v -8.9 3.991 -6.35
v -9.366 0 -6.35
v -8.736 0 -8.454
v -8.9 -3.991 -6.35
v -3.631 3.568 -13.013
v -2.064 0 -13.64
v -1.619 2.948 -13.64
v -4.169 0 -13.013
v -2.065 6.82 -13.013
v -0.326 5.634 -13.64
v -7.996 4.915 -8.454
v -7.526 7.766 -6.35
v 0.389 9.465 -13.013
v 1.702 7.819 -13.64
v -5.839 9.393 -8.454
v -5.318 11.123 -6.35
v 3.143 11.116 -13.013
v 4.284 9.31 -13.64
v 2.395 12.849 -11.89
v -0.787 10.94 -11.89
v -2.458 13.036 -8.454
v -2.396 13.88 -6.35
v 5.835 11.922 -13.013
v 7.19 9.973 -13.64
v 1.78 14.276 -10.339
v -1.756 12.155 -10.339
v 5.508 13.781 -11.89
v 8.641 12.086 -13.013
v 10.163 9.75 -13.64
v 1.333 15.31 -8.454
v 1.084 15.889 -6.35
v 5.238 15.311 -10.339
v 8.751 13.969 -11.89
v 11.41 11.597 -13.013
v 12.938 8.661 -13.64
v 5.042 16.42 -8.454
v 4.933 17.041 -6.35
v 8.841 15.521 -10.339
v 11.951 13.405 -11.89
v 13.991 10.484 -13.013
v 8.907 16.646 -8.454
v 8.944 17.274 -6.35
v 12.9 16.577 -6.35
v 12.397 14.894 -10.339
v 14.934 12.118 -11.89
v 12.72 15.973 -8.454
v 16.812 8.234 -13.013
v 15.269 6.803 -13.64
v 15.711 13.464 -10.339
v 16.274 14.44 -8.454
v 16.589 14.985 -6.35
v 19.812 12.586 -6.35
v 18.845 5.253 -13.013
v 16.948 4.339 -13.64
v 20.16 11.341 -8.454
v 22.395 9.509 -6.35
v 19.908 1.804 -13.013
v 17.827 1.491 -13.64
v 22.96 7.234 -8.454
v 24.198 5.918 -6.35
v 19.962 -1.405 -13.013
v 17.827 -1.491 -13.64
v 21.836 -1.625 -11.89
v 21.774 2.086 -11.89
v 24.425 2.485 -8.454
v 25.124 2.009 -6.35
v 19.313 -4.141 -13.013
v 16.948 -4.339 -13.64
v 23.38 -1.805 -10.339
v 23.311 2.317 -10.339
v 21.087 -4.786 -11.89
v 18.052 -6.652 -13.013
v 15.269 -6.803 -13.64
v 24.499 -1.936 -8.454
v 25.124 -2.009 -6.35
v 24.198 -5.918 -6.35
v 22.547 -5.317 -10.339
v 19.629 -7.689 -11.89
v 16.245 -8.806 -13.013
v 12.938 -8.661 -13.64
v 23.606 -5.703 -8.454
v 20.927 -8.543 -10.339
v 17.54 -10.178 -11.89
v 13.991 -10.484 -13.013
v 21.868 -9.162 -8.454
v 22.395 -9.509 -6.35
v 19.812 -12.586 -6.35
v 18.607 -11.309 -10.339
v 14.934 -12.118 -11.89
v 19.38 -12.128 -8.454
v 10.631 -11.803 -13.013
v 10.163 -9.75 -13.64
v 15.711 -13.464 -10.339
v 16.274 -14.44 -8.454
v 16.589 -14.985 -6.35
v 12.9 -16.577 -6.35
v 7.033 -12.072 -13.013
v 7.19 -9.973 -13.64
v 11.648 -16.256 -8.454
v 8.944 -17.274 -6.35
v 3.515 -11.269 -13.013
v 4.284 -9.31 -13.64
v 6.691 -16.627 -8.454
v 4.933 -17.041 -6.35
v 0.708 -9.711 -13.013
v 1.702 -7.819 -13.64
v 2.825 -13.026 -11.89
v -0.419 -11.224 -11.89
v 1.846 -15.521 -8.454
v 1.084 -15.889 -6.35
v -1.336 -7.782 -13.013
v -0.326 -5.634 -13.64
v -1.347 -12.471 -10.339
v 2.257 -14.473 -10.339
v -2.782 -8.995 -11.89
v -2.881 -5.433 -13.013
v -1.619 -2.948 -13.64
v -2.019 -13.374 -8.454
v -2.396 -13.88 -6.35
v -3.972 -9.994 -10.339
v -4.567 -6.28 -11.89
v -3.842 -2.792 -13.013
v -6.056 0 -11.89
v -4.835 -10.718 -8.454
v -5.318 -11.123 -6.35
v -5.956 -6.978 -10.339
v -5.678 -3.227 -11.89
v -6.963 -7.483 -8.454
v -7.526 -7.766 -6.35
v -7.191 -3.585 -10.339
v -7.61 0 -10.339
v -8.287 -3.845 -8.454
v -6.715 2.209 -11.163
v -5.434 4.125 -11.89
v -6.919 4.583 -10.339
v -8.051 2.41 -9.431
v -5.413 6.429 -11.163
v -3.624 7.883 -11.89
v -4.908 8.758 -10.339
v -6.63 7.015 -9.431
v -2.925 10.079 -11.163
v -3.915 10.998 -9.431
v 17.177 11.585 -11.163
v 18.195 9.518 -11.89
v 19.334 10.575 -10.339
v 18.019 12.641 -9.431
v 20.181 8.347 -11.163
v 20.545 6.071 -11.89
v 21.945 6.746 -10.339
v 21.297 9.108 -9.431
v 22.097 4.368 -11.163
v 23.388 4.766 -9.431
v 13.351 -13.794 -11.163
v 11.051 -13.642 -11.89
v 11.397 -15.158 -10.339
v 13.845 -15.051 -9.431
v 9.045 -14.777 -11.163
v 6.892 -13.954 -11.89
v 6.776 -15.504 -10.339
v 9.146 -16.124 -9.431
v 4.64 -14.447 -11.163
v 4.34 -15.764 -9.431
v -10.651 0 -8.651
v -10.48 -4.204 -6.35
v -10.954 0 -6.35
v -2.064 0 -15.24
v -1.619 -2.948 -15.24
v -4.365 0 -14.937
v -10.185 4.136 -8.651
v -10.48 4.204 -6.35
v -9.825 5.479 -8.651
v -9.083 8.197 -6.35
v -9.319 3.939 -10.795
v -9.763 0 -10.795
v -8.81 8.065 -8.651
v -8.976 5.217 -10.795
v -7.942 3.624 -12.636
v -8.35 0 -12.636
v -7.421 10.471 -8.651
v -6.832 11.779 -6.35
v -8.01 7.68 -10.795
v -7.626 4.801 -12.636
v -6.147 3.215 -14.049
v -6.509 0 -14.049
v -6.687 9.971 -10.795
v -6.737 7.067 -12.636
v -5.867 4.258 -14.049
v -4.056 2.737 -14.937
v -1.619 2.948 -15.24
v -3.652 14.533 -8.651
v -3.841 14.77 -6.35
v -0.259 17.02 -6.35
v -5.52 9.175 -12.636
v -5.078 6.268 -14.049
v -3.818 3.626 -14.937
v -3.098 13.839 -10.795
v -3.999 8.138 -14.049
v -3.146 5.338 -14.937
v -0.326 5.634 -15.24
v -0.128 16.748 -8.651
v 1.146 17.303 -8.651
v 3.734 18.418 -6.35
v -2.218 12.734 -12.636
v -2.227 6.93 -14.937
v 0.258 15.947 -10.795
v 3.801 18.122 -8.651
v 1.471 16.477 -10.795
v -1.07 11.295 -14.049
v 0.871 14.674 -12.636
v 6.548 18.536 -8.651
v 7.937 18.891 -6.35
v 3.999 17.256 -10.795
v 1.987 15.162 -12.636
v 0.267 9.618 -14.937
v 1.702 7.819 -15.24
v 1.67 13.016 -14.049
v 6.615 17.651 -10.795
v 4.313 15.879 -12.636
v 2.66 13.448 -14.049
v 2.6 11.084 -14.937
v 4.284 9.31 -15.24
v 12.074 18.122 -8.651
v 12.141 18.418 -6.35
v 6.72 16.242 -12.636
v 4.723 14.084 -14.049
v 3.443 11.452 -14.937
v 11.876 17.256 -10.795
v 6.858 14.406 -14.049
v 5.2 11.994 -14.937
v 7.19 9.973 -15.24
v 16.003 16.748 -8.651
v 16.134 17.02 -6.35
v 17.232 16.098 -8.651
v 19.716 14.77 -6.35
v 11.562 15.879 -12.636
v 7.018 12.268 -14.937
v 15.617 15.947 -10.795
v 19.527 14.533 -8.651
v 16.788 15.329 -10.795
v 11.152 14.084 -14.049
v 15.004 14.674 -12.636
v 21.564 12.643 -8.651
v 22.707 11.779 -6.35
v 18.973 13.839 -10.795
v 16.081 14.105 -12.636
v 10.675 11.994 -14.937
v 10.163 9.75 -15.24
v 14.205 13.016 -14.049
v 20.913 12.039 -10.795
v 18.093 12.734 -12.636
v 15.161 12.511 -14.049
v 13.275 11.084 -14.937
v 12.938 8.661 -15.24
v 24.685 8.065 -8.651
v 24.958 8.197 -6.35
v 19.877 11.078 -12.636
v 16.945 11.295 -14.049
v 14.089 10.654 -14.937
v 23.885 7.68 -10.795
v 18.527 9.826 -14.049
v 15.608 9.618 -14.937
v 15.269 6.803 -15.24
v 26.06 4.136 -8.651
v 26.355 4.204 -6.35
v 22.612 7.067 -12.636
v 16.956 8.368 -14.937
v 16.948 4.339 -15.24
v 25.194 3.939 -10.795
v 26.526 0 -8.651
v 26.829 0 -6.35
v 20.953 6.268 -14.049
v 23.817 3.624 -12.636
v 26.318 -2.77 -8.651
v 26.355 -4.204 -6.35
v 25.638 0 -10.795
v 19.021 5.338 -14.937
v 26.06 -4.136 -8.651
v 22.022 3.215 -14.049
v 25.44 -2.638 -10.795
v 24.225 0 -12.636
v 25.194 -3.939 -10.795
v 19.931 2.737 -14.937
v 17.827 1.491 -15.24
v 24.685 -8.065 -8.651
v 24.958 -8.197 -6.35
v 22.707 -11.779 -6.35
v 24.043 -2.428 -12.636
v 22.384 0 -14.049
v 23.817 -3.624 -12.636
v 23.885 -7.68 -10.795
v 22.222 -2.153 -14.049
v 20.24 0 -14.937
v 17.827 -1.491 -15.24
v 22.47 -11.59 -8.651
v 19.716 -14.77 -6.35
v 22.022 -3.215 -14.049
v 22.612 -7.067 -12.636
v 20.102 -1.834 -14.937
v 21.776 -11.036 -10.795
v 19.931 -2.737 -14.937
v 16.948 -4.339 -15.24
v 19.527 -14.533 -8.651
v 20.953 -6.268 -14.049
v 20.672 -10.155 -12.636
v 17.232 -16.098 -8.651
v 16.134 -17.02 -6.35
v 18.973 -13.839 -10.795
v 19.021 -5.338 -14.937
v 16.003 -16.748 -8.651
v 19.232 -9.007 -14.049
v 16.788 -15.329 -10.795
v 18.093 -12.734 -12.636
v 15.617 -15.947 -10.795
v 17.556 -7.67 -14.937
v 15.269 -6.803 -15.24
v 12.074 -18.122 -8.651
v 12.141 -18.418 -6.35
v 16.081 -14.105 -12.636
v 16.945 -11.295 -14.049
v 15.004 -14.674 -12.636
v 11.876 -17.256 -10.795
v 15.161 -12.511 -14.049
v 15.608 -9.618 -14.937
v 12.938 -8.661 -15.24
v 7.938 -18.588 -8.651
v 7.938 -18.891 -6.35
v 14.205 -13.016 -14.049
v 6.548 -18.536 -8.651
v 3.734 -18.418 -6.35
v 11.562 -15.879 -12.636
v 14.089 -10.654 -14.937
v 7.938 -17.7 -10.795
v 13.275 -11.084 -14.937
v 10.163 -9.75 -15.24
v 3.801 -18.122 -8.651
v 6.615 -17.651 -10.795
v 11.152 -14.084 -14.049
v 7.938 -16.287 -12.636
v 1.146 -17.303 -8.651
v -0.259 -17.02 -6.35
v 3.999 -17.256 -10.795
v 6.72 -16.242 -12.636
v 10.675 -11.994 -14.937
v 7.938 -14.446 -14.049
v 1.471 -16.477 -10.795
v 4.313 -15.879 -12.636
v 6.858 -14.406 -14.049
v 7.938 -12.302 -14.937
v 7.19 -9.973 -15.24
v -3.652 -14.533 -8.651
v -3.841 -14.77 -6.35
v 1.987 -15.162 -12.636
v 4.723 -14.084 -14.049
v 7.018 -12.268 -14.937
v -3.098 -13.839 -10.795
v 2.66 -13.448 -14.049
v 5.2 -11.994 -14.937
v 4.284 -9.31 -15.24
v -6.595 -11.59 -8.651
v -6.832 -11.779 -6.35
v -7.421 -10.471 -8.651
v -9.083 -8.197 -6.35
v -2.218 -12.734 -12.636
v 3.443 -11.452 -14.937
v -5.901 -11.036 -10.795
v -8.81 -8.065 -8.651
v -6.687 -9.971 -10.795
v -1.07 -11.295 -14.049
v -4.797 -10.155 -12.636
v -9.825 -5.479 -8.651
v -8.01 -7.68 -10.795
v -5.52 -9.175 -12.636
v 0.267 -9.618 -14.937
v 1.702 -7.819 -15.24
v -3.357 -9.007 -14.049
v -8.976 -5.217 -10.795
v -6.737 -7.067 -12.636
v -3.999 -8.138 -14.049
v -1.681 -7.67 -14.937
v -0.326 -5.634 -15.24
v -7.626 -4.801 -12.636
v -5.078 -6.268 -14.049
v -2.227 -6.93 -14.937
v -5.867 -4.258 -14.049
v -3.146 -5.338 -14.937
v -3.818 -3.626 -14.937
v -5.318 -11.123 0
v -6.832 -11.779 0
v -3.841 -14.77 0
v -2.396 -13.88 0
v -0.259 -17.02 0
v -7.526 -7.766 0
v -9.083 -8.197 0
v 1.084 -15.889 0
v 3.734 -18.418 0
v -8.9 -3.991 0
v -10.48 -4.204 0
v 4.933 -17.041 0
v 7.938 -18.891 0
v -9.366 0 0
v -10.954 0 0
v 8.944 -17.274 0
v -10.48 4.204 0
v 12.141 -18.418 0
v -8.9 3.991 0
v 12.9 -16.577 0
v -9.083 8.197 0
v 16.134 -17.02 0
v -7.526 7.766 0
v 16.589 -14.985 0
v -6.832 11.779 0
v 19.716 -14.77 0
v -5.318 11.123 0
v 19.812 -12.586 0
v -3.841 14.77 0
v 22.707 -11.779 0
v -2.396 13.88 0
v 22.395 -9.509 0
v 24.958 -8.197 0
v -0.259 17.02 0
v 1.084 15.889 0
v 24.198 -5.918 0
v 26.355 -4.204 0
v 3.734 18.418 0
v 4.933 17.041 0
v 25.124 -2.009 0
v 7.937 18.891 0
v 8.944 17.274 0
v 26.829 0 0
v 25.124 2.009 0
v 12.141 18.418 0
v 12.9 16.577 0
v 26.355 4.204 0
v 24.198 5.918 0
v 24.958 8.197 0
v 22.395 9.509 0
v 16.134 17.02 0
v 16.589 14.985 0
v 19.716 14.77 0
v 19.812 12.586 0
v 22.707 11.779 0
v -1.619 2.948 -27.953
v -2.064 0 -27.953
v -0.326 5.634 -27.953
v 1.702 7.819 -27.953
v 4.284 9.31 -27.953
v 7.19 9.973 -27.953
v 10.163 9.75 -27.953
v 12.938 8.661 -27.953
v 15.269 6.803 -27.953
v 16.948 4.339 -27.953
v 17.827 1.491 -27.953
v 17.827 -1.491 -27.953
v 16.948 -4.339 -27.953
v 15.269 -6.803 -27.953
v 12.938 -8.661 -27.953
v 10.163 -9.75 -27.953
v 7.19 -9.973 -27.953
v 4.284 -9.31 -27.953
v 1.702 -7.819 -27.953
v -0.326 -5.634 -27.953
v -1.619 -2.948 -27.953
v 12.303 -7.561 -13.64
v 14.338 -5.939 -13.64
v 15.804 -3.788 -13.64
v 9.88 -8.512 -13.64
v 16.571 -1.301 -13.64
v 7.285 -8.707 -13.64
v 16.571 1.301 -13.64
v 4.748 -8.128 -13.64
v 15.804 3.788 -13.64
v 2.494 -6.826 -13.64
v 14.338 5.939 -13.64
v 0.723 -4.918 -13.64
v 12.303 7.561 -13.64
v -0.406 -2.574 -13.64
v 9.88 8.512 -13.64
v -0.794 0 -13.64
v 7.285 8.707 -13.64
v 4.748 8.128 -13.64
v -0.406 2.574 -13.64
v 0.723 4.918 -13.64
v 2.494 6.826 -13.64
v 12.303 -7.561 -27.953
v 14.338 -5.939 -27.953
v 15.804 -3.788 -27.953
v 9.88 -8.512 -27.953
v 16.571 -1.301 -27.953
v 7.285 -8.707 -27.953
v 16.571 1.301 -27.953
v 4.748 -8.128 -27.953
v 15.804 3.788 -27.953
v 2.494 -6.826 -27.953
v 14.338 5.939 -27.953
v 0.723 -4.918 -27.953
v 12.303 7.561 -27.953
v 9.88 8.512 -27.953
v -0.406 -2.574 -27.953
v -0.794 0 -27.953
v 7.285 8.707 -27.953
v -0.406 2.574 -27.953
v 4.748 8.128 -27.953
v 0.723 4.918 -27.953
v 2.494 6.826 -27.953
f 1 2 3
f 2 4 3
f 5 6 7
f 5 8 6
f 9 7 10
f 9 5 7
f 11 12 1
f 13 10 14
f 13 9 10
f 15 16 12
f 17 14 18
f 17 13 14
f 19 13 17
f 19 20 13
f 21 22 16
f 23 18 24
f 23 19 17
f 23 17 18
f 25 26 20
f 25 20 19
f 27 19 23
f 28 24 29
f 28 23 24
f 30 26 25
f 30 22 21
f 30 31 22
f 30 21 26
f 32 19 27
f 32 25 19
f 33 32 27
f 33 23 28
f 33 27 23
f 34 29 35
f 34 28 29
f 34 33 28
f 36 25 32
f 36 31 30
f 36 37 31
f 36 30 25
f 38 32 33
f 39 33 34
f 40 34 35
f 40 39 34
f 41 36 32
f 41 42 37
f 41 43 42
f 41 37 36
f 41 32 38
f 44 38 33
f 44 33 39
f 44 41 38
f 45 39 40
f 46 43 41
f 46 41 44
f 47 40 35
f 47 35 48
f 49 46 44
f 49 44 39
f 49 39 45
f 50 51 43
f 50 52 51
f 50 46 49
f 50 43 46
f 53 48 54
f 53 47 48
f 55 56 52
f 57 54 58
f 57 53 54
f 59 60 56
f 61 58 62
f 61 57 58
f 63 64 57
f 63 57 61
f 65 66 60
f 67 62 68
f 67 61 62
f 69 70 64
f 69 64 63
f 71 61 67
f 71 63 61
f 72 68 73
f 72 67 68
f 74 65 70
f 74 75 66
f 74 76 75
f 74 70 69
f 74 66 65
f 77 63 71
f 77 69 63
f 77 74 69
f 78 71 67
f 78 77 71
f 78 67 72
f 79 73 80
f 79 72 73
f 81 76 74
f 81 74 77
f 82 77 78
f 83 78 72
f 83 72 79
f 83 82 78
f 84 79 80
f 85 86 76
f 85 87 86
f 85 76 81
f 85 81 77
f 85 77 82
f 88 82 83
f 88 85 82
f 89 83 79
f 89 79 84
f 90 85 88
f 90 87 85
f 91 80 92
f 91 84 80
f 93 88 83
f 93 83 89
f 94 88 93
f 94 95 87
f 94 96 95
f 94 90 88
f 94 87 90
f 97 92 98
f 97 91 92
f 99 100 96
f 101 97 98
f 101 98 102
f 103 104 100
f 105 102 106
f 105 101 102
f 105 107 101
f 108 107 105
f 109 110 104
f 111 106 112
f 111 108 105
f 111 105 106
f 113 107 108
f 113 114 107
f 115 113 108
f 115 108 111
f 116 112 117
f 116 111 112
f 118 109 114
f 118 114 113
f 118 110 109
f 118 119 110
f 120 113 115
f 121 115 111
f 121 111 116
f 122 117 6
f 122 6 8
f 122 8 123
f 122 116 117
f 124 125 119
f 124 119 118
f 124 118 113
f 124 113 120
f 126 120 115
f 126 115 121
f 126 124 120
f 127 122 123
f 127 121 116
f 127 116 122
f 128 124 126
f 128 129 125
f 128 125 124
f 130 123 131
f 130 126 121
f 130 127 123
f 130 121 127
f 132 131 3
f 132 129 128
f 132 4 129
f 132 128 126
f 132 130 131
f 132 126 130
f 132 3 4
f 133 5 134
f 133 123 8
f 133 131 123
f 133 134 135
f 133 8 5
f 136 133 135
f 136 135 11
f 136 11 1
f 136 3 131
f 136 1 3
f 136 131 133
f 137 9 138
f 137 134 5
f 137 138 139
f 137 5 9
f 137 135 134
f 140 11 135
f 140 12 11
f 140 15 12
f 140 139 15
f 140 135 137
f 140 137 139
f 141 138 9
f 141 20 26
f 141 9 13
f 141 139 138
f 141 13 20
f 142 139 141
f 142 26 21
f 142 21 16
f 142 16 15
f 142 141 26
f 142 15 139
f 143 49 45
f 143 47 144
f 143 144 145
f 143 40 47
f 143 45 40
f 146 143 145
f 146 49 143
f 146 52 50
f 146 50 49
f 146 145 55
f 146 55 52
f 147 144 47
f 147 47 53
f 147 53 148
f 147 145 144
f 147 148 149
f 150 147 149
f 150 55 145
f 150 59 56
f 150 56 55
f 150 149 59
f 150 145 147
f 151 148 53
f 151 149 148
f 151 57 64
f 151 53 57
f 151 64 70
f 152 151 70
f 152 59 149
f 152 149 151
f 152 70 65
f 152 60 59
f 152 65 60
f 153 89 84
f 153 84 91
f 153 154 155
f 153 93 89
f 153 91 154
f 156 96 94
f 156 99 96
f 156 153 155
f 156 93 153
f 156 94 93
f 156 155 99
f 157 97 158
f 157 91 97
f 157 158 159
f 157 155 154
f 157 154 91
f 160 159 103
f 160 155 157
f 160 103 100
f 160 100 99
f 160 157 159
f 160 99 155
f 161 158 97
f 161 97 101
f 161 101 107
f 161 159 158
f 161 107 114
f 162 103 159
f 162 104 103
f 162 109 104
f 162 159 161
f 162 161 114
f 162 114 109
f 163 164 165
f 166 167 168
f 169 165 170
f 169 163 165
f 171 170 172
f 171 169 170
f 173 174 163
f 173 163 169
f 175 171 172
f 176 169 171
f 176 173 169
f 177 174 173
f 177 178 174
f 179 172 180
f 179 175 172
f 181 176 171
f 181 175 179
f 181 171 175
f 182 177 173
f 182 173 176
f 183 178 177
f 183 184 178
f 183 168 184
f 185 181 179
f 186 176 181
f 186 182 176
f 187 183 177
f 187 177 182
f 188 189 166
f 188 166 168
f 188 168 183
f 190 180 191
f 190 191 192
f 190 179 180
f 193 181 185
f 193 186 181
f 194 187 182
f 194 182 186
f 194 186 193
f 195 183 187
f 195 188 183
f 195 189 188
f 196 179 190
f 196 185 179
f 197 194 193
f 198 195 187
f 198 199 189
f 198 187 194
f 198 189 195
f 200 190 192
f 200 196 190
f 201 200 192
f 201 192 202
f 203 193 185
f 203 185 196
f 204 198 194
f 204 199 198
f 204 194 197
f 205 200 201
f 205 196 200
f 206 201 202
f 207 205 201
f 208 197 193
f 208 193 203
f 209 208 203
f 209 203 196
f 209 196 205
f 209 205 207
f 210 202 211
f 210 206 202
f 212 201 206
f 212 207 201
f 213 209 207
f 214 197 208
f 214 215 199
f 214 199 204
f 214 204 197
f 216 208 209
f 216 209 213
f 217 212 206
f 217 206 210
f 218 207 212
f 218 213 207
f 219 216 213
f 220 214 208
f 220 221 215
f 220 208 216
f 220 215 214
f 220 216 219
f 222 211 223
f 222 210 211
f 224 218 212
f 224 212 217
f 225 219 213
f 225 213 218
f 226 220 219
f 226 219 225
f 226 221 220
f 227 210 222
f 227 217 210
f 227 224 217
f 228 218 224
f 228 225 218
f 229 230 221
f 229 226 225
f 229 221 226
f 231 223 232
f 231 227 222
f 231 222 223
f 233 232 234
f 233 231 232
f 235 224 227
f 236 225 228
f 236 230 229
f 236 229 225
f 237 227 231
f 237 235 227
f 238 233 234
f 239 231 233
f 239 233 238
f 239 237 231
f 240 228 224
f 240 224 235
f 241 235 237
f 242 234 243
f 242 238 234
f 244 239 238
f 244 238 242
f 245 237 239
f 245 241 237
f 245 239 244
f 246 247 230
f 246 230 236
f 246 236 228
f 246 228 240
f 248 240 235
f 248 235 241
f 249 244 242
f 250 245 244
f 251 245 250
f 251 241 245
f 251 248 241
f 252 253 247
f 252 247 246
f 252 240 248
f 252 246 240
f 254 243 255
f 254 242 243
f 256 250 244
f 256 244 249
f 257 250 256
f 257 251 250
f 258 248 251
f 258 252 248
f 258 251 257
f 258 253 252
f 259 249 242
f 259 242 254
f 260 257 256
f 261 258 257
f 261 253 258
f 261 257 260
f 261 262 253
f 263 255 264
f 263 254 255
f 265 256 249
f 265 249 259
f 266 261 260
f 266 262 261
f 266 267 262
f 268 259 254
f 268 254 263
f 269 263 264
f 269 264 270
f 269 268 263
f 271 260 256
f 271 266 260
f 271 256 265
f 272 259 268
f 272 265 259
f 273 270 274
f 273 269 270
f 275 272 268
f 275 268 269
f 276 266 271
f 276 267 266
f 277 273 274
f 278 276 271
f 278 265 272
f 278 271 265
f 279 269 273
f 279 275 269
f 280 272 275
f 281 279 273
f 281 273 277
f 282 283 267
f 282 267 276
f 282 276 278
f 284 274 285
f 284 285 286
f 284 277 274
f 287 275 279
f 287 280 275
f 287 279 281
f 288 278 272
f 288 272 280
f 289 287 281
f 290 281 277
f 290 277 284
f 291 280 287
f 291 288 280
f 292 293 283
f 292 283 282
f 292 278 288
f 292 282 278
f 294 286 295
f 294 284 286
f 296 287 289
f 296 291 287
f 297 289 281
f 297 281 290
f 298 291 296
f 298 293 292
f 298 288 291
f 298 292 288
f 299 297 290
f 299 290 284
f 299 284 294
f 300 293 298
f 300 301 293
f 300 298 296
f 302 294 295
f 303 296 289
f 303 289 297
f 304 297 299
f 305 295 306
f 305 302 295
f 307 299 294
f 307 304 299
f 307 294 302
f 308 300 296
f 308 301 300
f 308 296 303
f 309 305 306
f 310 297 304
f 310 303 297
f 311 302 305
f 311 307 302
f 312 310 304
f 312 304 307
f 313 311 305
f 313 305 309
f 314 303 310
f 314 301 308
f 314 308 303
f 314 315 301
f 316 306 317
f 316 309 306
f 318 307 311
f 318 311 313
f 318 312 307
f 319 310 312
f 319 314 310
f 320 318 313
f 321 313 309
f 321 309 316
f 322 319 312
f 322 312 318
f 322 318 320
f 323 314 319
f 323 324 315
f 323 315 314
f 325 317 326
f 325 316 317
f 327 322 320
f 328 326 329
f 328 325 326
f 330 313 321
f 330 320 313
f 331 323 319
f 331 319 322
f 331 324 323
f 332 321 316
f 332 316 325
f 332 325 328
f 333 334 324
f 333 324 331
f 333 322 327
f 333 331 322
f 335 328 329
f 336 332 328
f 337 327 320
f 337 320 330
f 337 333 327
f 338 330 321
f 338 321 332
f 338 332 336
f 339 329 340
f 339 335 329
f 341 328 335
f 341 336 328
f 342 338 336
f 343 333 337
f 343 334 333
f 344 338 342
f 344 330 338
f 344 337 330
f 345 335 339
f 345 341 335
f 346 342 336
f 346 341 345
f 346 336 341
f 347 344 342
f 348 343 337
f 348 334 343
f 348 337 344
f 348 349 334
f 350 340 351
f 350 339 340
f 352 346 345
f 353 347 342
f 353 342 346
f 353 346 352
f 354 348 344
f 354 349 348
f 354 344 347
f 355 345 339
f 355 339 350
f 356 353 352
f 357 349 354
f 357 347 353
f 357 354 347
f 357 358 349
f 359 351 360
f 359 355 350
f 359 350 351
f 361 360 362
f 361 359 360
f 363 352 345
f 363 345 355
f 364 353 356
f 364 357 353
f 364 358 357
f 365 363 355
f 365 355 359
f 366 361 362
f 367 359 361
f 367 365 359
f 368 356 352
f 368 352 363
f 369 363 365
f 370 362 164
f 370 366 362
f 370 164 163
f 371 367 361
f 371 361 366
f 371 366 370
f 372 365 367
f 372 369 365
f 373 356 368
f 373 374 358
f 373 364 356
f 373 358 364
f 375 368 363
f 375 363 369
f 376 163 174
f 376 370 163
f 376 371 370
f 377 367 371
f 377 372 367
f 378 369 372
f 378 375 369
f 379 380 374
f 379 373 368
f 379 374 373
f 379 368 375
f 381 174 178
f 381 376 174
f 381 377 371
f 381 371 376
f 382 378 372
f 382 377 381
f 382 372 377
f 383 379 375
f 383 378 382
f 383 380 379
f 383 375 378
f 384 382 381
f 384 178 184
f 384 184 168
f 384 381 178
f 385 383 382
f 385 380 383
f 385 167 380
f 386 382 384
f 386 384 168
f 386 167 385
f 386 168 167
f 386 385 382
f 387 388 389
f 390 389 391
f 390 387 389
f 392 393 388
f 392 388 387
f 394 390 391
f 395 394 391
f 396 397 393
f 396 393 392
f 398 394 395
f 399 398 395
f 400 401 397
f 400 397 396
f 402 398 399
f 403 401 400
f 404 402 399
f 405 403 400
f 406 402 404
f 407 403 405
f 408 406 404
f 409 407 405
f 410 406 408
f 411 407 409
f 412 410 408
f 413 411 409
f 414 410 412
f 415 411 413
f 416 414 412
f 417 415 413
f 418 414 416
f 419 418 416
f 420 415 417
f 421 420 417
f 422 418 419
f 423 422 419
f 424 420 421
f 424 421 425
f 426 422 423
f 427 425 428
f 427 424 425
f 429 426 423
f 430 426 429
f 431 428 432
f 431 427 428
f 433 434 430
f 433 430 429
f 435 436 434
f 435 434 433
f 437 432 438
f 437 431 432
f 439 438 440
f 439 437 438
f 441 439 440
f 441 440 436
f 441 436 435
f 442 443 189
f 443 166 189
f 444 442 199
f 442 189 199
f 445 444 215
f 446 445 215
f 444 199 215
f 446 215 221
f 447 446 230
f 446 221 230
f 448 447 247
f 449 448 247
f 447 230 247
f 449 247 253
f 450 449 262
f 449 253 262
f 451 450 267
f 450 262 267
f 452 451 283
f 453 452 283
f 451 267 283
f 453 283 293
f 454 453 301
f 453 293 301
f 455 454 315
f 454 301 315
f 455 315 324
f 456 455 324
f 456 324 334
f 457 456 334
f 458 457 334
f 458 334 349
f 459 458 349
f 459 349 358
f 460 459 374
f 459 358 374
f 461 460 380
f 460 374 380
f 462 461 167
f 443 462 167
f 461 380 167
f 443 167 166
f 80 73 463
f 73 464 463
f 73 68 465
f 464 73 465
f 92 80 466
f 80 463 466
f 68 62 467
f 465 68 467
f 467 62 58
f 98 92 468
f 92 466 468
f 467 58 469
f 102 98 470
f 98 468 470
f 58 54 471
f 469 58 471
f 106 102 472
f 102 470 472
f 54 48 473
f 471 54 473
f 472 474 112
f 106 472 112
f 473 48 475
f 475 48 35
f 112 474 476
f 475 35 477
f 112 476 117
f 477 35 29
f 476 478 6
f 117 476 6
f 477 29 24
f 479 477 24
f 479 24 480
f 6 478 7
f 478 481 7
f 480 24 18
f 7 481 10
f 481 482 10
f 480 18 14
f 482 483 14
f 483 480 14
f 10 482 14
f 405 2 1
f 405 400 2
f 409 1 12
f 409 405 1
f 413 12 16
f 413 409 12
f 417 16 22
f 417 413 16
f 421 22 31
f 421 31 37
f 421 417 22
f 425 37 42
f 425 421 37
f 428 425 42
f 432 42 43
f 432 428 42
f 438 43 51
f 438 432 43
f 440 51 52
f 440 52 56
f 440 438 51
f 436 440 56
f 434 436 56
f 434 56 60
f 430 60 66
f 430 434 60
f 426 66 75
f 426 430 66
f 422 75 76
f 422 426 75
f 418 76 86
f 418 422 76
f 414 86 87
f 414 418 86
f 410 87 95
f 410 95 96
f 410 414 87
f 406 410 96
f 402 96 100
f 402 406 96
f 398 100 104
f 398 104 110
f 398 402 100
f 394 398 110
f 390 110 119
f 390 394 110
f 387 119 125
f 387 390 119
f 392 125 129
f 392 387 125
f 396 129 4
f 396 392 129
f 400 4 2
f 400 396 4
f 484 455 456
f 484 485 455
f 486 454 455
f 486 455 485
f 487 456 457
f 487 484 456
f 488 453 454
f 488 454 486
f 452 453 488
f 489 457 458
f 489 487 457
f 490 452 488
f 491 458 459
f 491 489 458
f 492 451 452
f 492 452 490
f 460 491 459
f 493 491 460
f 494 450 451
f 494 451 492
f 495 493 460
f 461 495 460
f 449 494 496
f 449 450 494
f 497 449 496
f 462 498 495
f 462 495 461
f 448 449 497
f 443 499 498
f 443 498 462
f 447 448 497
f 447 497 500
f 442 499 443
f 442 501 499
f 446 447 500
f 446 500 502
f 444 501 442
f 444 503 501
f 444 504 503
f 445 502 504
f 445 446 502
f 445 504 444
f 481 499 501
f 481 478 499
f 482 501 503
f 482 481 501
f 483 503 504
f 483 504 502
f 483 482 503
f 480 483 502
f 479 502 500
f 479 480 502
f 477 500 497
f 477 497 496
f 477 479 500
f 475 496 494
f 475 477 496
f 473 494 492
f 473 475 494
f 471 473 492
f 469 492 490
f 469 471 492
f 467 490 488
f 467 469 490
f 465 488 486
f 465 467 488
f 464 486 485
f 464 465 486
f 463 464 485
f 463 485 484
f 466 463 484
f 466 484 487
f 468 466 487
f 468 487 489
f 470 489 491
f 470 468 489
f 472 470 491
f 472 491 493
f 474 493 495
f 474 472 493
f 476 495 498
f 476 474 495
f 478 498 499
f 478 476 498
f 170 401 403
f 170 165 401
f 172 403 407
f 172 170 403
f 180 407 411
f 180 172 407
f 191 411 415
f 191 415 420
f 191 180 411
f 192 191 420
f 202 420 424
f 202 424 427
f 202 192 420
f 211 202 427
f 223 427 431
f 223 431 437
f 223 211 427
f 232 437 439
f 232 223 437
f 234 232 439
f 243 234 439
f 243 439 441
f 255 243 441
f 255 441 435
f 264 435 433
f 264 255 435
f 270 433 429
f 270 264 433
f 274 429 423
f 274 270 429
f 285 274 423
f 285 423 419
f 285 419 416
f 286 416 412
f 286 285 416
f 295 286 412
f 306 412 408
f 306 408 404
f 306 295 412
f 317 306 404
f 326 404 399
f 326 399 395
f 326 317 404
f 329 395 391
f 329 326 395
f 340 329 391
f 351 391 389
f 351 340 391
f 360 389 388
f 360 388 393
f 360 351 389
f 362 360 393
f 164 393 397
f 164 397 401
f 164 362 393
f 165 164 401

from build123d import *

# Parameters (mm, degrees)
F0_W   = 1.27
F0_H   = 1.6002
F0_H_2 = 12.712561


with BuildPart() as f1:
    # F0 (on Front) → F1 (revolve)
    with BuildSketch(Plane.XZ):
        with BuildLine():
            Line((-9.36625, 0), (-10.95375, 0))
            Line((-10.95375, 0), (-10.95375, -6.35))
            ThreePointArc((-10.95375, -6.35), (-8.349929, -12.636179), (-2.06375, -15.24))
            Line((-2.06375, -15.24), (-2.06375, -13.6398))
            ThreePointArc((-2.06375, -13.6398), (-6.880829, -11.16276), (-9.36625, -6.35))
            Line((-9.36625, -6.35), (-9.36625, 0))
        make_face()
        with Locations((-1.42875, -14.4399)):
            Rectangle(F0_W, F0_H)
        with Locations((-1.42875, -21.59628)):
            Rectangle(F0_W, F0_H_2)
    revolve(axis=Axis((7.9375, 0, -13.976281), (0, 0, -1)))


solid = f1.part
